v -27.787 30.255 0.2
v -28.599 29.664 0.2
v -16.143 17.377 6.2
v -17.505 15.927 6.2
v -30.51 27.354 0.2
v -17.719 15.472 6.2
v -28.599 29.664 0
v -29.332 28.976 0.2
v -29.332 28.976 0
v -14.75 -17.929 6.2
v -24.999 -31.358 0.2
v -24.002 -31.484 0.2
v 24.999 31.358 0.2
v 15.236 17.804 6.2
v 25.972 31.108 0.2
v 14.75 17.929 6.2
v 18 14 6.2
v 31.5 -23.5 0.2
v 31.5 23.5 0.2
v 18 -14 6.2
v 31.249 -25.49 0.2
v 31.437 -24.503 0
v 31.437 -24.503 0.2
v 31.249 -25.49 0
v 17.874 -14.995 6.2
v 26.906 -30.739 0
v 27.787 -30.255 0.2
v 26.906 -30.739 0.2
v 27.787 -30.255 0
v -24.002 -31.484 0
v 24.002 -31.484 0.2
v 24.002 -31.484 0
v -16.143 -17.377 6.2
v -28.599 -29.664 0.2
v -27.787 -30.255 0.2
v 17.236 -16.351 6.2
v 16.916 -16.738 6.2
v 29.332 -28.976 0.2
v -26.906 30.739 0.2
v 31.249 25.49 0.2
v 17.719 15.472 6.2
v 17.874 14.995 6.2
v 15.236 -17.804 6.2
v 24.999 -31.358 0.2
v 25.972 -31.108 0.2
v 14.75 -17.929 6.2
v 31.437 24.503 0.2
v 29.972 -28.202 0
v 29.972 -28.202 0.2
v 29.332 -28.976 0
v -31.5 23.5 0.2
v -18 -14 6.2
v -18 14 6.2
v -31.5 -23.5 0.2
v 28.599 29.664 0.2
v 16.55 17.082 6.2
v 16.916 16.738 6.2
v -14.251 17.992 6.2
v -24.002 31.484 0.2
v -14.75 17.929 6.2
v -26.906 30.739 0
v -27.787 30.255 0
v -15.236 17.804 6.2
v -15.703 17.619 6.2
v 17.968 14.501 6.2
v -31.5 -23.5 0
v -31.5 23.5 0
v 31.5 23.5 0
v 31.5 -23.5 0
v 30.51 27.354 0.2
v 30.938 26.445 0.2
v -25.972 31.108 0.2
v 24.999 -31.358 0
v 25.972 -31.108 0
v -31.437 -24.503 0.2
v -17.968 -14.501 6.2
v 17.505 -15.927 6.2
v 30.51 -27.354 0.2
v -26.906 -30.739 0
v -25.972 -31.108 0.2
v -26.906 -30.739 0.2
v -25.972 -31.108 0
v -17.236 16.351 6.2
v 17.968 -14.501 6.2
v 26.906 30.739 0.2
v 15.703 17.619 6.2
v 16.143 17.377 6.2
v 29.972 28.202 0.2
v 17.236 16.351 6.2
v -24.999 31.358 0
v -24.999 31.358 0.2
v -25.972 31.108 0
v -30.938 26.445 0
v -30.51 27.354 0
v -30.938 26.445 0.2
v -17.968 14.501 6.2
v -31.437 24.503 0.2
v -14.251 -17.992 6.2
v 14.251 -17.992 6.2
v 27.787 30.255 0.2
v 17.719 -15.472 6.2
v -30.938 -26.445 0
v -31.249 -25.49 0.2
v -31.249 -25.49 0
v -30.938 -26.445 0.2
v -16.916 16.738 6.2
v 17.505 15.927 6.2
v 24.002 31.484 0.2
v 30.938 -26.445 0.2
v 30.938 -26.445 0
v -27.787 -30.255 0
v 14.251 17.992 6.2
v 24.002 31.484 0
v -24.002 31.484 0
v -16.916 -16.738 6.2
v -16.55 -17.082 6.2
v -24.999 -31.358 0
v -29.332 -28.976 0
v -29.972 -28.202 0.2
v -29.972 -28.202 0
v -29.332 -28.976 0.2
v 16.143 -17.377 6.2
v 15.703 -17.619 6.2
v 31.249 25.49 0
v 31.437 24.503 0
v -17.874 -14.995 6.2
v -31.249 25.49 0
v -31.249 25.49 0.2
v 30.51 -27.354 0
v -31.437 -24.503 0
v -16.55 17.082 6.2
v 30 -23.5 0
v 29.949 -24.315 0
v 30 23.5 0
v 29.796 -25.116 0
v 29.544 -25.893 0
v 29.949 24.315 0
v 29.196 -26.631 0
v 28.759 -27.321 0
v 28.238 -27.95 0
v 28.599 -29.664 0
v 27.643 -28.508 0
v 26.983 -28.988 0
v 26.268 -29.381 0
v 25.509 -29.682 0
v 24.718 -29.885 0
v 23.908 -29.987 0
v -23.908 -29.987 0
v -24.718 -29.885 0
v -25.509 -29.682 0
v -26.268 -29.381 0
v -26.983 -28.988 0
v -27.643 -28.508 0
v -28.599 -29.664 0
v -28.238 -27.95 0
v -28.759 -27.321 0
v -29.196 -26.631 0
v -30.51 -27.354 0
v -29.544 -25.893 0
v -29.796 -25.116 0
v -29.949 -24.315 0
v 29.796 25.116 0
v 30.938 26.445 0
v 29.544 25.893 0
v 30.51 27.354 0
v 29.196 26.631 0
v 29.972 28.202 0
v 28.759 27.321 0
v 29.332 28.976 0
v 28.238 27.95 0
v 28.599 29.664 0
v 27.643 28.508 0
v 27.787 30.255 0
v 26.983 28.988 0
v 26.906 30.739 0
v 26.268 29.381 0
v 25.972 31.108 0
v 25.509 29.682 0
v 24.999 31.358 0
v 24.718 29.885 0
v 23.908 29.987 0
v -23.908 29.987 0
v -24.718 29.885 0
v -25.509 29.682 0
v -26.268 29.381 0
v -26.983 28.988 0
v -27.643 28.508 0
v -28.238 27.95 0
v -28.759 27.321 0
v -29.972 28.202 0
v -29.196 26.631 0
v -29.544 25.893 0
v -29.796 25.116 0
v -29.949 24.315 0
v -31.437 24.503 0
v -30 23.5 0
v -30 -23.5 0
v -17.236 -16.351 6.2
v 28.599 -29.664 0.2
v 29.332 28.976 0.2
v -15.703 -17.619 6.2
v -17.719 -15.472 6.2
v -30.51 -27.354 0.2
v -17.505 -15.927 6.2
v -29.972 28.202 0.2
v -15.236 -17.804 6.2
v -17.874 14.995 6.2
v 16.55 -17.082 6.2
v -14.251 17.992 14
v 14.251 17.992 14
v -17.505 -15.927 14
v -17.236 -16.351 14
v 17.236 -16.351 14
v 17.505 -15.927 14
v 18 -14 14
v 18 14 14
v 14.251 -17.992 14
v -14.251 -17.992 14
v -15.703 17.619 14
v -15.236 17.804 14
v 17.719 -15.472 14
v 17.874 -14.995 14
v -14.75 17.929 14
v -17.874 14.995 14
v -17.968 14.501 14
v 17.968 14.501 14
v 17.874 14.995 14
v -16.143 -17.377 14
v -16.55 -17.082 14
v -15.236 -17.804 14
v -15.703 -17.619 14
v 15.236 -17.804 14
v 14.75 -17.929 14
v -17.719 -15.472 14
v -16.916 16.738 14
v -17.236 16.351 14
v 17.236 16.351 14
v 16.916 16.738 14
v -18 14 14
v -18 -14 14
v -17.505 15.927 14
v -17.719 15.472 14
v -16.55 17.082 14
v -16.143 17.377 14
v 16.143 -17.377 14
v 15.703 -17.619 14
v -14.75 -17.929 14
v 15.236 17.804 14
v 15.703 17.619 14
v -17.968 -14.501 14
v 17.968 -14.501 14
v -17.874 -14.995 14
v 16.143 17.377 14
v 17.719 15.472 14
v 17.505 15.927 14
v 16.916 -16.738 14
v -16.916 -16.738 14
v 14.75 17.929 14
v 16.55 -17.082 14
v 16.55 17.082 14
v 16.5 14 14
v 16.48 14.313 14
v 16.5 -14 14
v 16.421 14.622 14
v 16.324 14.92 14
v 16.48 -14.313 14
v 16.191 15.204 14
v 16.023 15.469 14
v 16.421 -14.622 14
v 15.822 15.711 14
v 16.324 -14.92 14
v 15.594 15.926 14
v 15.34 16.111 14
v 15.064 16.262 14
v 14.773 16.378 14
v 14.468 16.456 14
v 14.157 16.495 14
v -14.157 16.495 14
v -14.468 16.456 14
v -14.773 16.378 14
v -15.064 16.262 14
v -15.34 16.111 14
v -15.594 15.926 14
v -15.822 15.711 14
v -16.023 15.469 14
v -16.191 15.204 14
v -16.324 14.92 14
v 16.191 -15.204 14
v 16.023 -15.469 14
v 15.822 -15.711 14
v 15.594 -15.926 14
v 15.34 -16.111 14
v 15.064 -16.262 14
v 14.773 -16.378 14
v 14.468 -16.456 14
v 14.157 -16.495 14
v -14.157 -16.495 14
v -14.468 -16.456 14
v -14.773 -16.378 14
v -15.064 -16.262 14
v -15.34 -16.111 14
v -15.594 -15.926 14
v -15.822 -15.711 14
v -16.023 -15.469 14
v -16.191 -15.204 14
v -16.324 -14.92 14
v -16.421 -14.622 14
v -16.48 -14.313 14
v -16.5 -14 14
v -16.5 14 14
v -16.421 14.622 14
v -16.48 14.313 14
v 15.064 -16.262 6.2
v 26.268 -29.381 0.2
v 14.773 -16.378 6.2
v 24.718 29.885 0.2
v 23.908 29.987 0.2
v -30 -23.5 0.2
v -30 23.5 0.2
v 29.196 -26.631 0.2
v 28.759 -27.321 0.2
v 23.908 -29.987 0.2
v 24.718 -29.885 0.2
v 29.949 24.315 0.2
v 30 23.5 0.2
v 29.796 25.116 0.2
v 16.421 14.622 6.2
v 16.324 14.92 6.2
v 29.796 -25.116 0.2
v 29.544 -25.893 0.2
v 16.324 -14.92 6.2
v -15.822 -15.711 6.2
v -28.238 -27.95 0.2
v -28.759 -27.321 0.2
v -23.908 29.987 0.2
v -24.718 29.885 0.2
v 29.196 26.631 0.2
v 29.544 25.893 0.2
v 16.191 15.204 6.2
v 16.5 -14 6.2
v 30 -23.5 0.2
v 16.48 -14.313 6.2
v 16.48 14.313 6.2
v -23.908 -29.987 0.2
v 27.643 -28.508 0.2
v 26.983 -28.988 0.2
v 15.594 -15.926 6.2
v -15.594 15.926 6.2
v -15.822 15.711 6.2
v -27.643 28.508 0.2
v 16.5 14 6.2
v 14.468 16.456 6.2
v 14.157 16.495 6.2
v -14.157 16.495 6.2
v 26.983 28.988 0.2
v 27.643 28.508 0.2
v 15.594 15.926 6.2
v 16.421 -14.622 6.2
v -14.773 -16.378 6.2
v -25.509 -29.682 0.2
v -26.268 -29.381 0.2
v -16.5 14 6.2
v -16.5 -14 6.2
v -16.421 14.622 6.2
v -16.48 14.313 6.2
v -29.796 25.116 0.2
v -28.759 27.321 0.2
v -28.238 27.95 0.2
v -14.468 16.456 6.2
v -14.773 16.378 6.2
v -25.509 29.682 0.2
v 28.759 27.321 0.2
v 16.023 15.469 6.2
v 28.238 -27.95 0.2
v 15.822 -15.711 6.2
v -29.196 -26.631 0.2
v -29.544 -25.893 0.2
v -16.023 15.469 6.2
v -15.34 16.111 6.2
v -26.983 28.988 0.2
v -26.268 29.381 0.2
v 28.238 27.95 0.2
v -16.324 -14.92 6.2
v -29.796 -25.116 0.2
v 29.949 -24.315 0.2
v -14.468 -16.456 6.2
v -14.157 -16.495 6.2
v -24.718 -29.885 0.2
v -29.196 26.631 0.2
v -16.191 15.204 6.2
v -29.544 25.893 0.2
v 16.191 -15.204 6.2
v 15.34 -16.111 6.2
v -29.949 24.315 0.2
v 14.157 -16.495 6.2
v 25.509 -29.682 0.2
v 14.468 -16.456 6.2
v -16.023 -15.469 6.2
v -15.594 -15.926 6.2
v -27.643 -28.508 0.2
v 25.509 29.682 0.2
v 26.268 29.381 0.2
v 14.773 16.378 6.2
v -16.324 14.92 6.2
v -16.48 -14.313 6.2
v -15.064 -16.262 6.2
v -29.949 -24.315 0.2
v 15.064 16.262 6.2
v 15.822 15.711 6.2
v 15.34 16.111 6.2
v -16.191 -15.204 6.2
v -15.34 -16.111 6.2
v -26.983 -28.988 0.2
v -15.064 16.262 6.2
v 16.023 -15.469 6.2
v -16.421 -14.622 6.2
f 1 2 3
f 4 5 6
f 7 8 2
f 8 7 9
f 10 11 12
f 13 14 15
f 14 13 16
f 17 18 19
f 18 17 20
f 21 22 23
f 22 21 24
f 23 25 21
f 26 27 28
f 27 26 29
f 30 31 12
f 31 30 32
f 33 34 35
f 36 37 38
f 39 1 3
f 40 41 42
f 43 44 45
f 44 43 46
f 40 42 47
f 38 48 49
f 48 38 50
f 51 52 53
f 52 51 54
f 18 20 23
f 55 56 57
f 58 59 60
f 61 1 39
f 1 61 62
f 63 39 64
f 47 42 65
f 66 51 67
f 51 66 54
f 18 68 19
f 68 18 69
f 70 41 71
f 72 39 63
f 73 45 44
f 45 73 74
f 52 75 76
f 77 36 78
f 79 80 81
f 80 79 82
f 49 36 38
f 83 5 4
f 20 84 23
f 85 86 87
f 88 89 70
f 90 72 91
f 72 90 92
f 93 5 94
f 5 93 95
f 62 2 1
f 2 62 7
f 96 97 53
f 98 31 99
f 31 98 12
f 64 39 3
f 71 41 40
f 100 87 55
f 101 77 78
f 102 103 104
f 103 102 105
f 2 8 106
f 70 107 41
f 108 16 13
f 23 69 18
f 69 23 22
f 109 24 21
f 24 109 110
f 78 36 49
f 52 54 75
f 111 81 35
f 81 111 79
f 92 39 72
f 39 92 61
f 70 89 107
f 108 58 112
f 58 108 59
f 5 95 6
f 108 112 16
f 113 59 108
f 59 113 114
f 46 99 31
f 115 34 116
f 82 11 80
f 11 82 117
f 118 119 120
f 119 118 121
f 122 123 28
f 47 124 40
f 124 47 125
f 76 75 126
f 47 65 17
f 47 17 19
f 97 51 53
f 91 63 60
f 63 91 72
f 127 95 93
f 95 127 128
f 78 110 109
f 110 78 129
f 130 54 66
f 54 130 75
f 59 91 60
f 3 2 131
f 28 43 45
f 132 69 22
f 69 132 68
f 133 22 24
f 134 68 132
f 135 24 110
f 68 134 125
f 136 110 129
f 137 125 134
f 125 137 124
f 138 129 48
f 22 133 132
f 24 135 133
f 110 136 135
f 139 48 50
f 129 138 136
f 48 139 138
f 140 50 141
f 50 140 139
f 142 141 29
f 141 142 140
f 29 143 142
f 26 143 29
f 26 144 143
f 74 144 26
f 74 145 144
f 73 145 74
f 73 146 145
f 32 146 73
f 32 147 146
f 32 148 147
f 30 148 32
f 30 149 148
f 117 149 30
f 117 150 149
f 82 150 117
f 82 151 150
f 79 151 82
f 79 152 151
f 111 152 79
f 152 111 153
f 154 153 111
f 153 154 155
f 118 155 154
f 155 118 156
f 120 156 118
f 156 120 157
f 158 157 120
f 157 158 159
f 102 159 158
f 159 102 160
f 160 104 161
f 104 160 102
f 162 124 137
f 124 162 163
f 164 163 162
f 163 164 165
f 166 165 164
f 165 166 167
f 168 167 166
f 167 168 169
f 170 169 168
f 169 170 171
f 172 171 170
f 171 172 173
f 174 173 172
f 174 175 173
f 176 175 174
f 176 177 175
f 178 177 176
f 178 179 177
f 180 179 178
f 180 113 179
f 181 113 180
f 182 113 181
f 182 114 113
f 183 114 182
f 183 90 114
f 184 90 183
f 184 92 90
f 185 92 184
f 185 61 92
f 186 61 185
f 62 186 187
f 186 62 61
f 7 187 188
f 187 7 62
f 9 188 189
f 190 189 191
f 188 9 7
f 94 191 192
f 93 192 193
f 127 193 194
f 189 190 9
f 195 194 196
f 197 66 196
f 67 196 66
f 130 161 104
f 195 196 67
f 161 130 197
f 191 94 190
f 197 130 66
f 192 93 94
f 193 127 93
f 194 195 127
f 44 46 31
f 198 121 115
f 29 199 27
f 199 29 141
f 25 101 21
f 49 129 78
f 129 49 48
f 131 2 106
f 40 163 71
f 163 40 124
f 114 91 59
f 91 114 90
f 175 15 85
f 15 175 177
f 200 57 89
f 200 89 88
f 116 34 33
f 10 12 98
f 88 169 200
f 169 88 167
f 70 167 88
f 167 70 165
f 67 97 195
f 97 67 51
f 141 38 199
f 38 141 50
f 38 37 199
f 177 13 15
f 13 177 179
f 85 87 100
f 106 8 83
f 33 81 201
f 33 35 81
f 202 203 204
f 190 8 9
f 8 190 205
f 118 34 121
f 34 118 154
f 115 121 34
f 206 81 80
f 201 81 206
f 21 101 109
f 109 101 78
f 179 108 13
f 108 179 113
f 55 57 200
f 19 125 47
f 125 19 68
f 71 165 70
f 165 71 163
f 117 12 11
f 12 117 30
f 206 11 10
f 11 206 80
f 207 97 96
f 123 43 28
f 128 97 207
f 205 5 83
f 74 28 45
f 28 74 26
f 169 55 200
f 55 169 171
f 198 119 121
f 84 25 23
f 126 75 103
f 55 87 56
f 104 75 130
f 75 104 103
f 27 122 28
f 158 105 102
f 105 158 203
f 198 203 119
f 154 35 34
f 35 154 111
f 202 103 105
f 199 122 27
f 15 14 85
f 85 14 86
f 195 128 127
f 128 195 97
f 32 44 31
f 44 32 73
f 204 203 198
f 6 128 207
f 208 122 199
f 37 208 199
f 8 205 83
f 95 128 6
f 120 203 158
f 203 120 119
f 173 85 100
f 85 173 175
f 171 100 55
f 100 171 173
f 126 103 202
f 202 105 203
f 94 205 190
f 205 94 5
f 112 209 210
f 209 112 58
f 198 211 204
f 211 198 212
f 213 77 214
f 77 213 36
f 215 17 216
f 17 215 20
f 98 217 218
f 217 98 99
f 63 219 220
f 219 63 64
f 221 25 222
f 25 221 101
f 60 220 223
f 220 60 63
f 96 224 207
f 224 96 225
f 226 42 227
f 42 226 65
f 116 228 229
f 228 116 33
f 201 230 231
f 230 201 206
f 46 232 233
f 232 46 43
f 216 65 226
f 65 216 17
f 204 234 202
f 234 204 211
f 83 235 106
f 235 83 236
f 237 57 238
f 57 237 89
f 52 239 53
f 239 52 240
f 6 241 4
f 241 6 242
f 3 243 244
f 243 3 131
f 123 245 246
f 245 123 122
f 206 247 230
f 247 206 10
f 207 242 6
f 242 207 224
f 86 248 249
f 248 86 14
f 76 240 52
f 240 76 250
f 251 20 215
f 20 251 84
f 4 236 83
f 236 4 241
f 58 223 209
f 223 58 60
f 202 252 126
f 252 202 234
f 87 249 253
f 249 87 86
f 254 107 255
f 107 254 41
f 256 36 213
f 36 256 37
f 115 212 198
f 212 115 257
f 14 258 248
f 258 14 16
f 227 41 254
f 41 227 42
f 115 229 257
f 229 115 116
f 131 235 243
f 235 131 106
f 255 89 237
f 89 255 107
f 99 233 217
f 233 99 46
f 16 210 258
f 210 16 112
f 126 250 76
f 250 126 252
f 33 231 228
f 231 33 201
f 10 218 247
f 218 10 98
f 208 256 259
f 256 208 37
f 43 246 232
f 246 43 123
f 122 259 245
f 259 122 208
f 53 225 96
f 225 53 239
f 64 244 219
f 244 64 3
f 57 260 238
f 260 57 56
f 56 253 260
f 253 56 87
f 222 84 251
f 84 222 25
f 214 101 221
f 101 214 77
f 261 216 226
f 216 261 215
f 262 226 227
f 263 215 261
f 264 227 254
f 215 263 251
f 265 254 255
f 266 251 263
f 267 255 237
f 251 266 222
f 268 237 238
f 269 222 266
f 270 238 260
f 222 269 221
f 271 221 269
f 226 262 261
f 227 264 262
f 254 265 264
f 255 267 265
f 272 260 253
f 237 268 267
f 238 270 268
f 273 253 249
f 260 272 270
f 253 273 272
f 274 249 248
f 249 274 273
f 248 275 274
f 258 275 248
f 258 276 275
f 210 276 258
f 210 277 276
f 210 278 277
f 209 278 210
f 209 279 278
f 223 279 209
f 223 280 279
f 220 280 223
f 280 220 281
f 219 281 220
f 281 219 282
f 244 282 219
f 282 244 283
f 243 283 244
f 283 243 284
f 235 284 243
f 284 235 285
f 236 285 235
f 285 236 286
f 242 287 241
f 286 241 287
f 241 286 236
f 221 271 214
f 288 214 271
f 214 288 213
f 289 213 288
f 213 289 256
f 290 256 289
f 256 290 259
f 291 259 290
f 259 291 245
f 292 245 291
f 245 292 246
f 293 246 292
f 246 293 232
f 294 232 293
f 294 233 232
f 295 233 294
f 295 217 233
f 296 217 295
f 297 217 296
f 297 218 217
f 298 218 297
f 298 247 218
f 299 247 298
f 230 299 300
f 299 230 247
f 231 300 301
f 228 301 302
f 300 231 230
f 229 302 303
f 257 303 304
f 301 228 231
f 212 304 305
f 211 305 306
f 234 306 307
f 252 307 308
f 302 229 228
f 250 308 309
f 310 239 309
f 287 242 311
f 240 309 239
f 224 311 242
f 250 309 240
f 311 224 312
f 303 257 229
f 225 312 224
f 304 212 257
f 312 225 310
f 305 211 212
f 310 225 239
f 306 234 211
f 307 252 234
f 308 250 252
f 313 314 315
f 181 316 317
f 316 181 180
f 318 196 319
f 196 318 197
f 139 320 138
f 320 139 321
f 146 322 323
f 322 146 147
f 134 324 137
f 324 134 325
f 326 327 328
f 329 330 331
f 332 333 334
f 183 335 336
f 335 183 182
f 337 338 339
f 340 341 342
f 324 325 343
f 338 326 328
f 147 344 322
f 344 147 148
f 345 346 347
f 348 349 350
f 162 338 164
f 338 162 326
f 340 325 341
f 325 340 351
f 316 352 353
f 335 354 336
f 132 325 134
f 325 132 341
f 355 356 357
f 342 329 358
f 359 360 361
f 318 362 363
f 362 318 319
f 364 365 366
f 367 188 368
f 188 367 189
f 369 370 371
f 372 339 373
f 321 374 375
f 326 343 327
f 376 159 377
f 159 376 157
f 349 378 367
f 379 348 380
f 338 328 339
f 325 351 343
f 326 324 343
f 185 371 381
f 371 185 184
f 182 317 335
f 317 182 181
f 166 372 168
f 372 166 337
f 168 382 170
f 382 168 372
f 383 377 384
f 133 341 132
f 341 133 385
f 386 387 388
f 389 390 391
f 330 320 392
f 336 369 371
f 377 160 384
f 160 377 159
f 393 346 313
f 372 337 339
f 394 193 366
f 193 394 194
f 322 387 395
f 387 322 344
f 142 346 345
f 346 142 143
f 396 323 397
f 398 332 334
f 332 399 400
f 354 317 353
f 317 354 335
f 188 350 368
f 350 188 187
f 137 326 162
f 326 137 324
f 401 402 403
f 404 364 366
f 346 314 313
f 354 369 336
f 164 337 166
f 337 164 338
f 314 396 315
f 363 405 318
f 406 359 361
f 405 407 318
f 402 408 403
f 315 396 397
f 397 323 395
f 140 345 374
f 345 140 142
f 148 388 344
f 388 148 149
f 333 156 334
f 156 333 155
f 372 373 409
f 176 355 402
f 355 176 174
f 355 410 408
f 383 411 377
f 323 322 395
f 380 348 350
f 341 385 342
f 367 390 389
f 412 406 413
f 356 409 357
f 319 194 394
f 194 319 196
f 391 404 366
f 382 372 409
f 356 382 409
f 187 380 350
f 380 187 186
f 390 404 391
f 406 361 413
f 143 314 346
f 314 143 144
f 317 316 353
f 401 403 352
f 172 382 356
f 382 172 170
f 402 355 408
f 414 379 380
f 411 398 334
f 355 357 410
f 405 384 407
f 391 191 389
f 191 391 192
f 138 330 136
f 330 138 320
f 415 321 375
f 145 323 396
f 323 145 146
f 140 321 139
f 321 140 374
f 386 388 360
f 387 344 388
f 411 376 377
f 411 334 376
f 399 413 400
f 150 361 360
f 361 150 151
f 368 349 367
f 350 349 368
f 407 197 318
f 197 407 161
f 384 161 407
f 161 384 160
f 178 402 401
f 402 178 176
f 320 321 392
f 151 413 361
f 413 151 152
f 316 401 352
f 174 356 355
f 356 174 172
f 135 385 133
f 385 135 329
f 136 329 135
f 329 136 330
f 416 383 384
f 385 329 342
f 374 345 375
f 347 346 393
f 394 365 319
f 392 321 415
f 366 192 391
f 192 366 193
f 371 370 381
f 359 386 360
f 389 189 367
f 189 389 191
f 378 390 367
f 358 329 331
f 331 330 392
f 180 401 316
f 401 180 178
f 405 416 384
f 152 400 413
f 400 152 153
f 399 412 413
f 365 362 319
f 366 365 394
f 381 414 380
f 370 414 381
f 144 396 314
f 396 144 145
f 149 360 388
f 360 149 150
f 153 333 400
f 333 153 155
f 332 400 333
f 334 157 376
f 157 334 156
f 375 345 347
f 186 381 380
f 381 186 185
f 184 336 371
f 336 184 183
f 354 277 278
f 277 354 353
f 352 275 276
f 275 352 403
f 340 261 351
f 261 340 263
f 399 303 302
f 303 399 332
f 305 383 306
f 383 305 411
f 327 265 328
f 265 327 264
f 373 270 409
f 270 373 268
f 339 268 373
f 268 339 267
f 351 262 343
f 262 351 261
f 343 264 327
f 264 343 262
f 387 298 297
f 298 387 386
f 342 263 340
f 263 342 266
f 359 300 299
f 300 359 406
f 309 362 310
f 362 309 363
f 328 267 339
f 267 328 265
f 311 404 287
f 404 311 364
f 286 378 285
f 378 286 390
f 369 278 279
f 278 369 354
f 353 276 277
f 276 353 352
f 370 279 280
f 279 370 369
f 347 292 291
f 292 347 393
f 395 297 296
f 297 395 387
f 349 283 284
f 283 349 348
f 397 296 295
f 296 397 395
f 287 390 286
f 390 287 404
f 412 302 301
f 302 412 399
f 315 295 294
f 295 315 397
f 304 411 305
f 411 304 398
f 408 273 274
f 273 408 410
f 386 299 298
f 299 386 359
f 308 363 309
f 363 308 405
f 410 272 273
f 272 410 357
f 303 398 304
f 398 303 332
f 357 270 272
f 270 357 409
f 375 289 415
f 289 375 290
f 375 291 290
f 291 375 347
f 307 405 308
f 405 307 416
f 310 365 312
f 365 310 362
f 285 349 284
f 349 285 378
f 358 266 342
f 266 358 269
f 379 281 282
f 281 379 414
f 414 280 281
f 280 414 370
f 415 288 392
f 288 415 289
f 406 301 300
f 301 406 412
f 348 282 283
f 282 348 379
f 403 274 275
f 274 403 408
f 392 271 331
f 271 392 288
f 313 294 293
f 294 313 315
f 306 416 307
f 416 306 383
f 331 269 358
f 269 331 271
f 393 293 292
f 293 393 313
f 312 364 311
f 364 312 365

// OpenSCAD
$fn = 50;

difference() {
	union() {
		translate(v = [0, 0, 14]) {
			rotate(a = [180, 0, 0]) {
				difference() {
					union() {
						translate(v = [0, 0, 0]) {
							rotate(a = [0, 0, 0]) {
								hull() {
									difference() {
										union() {
											translate(v = [0, 0, 7.8]) {
												hull() {
													translate(v = [-14.0, 14.0, 0]) {
														cylinder(h = 0.2, r = 4);
													}
													translate(v = [14.0, 14.0, 0]) {
														cylinder(h = 0.2, r = 4);
													}
													translate(v = [-14.0, -14.0, 0]) {
														cylinder(h = 0.2, r = 4);
													}
													translate(v = [14.0, -14.0, 0]) {
														cylinder(h = 0.2, r = 4);
													}
												}
											}
											translate(v = [0, 0, 13.8]) {
												hull() {
													translate(v = [-23.5, 23.5, 0]) {
														cylinder(h = 0.2, r = 8);
													}
													translate(v = [23.5, 23.5, 0]) {
														cylinder(h = 0.2, r = 8);
													}
													translate(v = [-23.5, -23.5, 0]) {
														cylinder(h = 0.2, r = 8);
													}
													translate(v = [23.5, -23.5, 0]) {
														cylinder(h = 0.2, r = 8);
													}
												}
											}
										}
										union();
									}
								}
							}
						}
						hull() {
							translate(v = [-14.0, 14.0, 0]) {
								cylinder(h = 8, r = 4);
							}
							translate(v = [14.0, 14.0, 0]) {
								cylinder(h = 8, r = 4);
							}
							translate(v = [-14.0, -14.0, 0]) {
								cylinder(h = 8, r = 4);
							}
							translate(v = [14.0, -14.0, 0]) {
								cylinder(h = 8, r = 4);
							}
						}
					}
					union() {
						translate(v = [0, 0, 0]) {
							rotate(a = [0, 0, 0]) {
								hull() {
									difference() {
										union() {
											translate(v = [0, 0, 7.8]) {
												hull() {
													translate(v = [-14.0, 14.0, 0]) {
														cylinder(h = 0.2, r = 2.5);
													}
													translate(v = [14.0, 14.0, 0]) {
														cylinder(h = 0.2, r = 2.5);
													}
													translate(v = [-14.0, -14.0, 0]) {
														cylinder(h = 0.2, r = 2.5);
													}
													translate(v = [14.0, -14.0, 0]) {
														cylinder(h = 0.2, r = 2.5);
													}
												}
											}
											translate(v = [0, 0, 13.8]) {
												hull() {
													translate(v = [-23.5, 23.5, 0]) {
														cylinder(h = 0.4, r = 6.5);
													}
													translate(v = [23.5, 23.5, 0]) {
														cylinder(h = 0.4, r = 6.5);
													}
													translate(v = [-23.5, -23.5, 0]) {
														cylinder(h = 0.4, r = 6.5);
													}
													translate(v = [23.5, -23.5, 0]) {
														cylinder(h = 0.4, r = 6.5);
													}
												}
											}
										}
										union();
									}
								}
							}
						}
						translate(v = [0, 0, -0.1]) {
							hull() {
								translate(v = [-14.0, 14.0, 0]) {
									cylinder(h = 8.2, r = 2.5);
								}
								translate(v = [14.0, 14.0, 0]) {
									cylinder(h = 8.2, r = 2.5);
								}
								translate(v = [-14.0, -14.0, 0]) {
									cylinder(h = 8.2, r = 2.5);
								}
								translate(v = [14.0, -14.0, 0]) {
									cylinder(h = 8.2, r = 2.5);
								}
							}
						}
					}
				}
			}
		}
	}
	union();
}
